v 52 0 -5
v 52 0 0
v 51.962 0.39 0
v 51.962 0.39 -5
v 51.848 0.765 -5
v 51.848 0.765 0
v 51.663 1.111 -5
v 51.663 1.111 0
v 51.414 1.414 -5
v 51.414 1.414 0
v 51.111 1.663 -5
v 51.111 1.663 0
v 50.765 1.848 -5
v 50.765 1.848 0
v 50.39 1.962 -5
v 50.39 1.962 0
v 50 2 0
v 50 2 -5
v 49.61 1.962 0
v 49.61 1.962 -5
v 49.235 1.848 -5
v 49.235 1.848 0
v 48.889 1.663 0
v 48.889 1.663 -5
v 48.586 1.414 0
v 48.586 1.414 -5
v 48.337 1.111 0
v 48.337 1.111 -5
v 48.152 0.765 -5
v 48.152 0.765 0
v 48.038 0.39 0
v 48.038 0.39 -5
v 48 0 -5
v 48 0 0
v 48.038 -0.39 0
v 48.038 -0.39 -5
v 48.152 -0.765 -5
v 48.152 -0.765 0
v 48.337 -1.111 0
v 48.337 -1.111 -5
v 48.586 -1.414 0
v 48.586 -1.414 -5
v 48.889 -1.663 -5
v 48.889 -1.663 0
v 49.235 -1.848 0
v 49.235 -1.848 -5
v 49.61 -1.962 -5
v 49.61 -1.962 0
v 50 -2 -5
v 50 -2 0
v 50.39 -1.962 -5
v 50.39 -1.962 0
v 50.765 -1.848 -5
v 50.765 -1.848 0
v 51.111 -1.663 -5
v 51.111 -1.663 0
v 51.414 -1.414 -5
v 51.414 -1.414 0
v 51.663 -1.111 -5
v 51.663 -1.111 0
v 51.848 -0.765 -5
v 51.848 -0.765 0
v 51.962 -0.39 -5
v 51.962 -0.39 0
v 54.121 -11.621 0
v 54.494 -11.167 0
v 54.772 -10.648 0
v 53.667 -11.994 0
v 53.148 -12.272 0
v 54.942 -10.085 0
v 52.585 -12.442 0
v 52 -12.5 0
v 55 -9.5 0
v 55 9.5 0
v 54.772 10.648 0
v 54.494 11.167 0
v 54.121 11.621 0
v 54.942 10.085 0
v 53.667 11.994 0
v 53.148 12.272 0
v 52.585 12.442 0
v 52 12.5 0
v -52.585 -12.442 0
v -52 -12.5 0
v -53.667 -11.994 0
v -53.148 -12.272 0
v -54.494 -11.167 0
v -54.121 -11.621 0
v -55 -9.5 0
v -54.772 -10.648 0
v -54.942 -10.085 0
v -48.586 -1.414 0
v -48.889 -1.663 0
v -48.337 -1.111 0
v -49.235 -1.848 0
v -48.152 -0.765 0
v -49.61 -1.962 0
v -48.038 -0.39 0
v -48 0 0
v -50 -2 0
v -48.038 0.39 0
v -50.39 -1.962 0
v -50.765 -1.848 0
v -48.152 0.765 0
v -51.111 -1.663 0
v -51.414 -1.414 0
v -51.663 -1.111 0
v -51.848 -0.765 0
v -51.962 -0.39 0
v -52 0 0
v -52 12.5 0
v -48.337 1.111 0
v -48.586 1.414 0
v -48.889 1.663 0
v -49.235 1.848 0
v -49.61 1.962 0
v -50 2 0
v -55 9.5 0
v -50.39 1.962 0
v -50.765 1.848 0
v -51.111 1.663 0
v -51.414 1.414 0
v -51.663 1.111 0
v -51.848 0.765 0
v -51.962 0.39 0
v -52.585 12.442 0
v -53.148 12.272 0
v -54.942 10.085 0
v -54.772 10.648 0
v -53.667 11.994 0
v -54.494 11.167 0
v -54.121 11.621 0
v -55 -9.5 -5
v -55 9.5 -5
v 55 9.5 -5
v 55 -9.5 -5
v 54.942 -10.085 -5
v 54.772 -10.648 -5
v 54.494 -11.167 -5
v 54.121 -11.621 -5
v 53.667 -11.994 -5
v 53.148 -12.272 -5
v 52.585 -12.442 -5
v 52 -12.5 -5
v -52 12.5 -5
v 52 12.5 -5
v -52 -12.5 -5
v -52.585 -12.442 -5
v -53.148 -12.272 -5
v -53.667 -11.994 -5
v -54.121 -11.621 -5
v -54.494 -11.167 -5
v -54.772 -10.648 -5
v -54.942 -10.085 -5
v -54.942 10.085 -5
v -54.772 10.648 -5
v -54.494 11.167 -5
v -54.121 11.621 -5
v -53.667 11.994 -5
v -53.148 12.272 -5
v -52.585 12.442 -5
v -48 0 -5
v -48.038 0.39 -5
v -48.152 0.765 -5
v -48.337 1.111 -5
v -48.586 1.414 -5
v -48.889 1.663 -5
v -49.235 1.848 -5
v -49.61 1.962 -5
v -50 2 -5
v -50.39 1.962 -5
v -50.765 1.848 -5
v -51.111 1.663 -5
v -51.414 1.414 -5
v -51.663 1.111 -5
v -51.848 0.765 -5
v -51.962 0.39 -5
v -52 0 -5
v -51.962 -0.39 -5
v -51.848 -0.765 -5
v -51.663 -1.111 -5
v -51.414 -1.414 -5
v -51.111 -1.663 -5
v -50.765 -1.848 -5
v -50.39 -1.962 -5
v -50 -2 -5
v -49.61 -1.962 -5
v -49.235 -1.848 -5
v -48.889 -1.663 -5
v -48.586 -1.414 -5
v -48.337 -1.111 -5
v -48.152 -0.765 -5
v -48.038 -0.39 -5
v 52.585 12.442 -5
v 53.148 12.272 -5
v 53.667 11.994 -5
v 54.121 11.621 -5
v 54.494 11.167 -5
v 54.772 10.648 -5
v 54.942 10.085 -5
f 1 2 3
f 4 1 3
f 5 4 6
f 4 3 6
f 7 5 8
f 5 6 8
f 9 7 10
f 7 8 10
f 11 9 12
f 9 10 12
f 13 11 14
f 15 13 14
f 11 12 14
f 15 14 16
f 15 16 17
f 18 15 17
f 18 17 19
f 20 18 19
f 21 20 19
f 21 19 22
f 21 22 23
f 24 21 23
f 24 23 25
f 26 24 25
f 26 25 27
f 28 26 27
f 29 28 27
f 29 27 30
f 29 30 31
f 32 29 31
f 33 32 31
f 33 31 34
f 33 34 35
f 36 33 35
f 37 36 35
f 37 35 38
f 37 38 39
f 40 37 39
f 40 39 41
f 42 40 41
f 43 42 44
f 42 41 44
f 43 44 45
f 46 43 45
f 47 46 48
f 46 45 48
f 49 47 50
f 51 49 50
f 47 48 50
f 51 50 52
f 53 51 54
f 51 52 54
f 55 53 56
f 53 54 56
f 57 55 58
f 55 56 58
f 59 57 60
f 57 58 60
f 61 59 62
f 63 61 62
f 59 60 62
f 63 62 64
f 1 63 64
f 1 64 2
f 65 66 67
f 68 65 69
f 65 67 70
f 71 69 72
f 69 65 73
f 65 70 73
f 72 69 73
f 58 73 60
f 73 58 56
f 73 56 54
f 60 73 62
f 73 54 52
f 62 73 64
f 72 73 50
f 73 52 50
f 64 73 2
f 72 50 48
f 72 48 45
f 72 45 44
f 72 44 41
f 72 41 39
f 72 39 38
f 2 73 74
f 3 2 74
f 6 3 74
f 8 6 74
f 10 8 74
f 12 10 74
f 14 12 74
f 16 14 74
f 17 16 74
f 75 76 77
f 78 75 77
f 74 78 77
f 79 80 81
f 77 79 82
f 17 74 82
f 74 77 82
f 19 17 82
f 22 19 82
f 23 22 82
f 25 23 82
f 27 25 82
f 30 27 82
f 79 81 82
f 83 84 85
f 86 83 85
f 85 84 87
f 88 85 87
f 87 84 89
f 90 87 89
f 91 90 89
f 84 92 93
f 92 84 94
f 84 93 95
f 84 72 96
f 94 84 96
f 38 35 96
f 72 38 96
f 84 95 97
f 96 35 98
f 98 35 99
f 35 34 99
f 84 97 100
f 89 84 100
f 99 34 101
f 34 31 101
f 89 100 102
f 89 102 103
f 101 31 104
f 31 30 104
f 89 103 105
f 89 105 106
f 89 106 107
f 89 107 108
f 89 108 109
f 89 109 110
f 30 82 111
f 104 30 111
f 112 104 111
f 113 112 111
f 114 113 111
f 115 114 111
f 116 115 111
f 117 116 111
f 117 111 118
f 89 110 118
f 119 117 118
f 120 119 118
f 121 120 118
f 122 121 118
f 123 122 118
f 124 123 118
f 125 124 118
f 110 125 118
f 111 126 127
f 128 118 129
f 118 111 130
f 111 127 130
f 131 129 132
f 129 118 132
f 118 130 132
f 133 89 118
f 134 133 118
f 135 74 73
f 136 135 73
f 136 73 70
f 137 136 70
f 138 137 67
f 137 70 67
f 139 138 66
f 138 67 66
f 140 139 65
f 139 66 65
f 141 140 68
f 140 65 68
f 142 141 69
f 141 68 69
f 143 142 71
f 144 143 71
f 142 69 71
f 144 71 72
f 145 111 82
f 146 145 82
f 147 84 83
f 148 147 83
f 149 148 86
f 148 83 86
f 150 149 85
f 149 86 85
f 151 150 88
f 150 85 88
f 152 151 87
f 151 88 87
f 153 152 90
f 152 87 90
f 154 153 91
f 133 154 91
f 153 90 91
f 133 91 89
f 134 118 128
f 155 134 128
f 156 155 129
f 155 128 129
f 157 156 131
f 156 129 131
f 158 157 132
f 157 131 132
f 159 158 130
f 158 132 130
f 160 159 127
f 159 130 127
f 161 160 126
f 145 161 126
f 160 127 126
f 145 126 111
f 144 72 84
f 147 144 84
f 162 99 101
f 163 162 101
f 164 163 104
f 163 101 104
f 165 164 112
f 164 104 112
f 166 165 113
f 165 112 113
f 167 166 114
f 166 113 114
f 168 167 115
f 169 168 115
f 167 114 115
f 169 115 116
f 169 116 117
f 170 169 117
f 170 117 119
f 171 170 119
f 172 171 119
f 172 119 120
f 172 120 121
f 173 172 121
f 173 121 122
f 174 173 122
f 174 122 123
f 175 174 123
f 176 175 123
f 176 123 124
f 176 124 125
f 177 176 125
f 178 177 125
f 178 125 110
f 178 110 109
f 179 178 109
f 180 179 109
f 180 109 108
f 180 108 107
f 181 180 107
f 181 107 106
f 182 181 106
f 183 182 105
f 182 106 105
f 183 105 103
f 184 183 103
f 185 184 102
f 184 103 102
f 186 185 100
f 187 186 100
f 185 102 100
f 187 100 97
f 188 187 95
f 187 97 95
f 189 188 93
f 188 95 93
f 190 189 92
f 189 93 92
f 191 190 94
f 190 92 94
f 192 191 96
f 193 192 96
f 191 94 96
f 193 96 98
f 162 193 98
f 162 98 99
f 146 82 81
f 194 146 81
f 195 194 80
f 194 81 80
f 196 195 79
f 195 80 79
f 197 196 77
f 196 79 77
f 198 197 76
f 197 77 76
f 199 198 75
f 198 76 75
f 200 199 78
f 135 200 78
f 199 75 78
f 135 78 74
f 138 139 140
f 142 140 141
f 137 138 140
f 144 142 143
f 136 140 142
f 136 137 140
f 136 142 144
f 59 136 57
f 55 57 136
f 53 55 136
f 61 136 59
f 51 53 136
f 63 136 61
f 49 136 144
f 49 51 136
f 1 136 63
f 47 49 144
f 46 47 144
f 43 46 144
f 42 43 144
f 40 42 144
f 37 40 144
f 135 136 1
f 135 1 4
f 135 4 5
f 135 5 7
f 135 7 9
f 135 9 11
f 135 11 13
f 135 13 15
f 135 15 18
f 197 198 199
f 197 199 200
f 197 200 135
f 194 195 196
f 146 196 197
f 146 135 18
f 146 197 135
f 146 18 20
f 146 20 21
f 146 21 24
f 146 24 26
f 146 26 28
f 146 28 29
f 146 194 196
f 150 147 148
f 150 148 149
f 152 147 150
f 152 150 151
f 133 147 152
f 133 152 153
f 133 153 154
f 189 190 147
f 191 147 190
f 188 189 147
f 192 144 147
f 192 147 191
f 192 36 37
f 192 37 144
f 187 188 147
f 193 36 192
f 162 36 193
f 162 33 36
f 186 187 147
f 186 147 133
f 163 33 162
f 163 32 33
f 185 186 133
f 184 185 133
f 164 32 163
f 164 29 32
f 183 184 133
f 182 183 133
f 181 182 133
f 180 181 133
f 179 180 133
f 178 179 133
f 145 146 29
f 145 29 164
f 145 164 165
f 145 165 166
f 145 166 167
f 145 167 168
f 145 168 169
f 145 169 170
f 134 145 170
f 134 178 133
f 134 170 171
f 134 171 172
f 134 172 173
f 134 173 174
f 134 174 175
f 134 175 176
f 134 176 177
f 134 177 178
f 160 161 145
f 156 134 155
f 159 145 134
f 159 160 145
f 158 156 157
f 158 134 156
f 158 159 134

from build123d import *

# Parameters (mm, degrees)
EXTRUDE_1_DEPTH     = 5
SKETCH_2_R          = 2
CUT_EXTRUDE_1_DEPTH = 6


with BuildPart() as part:
    # 草图1 → 凸台-拉伸1 (new body)
    with BuildSketch(Plane.XY):
        with BuildLine():
            Line((-52, 12.5), (52, 12.5))
            ThreePointArc((52, 12.5), (54.121320344, 11.621320344), (55, 9.5))
            Line((55, 9.5), (55, -9.5))
            ThreePointArc((55, -9.5), (54.121320344, -11.621320344), (52, -12.5))
            Line((52, -12.5), (-52, -12.5))
            ThreePointArc((-52, -12.5), (-54.121320344, -11.621320344), (-55, -9.5))
            Line((-55, -9.5), (-55, 9.5))
            ThreePointArc((-55, 9.5), (-54.121320344, 11.621320344), (-52, 12.5))
        make_face()
    extrude(amount=-EXTRUDE_1_DEPTH)

    # 草图2 → 切除-拉伸1 (cut, through all)
    with BuildSketch(Plane.XY):
        with Locations((50, 0)):
            Circle(SKETCH_2_R)
        with Locations((-50, 0)):
            Circle(SKETCH_2_R)
    extrude(amount=-CUT_EXTRUDE_1_DEPTH, mode=Mode.SUBTRACT)


solid = part.part
